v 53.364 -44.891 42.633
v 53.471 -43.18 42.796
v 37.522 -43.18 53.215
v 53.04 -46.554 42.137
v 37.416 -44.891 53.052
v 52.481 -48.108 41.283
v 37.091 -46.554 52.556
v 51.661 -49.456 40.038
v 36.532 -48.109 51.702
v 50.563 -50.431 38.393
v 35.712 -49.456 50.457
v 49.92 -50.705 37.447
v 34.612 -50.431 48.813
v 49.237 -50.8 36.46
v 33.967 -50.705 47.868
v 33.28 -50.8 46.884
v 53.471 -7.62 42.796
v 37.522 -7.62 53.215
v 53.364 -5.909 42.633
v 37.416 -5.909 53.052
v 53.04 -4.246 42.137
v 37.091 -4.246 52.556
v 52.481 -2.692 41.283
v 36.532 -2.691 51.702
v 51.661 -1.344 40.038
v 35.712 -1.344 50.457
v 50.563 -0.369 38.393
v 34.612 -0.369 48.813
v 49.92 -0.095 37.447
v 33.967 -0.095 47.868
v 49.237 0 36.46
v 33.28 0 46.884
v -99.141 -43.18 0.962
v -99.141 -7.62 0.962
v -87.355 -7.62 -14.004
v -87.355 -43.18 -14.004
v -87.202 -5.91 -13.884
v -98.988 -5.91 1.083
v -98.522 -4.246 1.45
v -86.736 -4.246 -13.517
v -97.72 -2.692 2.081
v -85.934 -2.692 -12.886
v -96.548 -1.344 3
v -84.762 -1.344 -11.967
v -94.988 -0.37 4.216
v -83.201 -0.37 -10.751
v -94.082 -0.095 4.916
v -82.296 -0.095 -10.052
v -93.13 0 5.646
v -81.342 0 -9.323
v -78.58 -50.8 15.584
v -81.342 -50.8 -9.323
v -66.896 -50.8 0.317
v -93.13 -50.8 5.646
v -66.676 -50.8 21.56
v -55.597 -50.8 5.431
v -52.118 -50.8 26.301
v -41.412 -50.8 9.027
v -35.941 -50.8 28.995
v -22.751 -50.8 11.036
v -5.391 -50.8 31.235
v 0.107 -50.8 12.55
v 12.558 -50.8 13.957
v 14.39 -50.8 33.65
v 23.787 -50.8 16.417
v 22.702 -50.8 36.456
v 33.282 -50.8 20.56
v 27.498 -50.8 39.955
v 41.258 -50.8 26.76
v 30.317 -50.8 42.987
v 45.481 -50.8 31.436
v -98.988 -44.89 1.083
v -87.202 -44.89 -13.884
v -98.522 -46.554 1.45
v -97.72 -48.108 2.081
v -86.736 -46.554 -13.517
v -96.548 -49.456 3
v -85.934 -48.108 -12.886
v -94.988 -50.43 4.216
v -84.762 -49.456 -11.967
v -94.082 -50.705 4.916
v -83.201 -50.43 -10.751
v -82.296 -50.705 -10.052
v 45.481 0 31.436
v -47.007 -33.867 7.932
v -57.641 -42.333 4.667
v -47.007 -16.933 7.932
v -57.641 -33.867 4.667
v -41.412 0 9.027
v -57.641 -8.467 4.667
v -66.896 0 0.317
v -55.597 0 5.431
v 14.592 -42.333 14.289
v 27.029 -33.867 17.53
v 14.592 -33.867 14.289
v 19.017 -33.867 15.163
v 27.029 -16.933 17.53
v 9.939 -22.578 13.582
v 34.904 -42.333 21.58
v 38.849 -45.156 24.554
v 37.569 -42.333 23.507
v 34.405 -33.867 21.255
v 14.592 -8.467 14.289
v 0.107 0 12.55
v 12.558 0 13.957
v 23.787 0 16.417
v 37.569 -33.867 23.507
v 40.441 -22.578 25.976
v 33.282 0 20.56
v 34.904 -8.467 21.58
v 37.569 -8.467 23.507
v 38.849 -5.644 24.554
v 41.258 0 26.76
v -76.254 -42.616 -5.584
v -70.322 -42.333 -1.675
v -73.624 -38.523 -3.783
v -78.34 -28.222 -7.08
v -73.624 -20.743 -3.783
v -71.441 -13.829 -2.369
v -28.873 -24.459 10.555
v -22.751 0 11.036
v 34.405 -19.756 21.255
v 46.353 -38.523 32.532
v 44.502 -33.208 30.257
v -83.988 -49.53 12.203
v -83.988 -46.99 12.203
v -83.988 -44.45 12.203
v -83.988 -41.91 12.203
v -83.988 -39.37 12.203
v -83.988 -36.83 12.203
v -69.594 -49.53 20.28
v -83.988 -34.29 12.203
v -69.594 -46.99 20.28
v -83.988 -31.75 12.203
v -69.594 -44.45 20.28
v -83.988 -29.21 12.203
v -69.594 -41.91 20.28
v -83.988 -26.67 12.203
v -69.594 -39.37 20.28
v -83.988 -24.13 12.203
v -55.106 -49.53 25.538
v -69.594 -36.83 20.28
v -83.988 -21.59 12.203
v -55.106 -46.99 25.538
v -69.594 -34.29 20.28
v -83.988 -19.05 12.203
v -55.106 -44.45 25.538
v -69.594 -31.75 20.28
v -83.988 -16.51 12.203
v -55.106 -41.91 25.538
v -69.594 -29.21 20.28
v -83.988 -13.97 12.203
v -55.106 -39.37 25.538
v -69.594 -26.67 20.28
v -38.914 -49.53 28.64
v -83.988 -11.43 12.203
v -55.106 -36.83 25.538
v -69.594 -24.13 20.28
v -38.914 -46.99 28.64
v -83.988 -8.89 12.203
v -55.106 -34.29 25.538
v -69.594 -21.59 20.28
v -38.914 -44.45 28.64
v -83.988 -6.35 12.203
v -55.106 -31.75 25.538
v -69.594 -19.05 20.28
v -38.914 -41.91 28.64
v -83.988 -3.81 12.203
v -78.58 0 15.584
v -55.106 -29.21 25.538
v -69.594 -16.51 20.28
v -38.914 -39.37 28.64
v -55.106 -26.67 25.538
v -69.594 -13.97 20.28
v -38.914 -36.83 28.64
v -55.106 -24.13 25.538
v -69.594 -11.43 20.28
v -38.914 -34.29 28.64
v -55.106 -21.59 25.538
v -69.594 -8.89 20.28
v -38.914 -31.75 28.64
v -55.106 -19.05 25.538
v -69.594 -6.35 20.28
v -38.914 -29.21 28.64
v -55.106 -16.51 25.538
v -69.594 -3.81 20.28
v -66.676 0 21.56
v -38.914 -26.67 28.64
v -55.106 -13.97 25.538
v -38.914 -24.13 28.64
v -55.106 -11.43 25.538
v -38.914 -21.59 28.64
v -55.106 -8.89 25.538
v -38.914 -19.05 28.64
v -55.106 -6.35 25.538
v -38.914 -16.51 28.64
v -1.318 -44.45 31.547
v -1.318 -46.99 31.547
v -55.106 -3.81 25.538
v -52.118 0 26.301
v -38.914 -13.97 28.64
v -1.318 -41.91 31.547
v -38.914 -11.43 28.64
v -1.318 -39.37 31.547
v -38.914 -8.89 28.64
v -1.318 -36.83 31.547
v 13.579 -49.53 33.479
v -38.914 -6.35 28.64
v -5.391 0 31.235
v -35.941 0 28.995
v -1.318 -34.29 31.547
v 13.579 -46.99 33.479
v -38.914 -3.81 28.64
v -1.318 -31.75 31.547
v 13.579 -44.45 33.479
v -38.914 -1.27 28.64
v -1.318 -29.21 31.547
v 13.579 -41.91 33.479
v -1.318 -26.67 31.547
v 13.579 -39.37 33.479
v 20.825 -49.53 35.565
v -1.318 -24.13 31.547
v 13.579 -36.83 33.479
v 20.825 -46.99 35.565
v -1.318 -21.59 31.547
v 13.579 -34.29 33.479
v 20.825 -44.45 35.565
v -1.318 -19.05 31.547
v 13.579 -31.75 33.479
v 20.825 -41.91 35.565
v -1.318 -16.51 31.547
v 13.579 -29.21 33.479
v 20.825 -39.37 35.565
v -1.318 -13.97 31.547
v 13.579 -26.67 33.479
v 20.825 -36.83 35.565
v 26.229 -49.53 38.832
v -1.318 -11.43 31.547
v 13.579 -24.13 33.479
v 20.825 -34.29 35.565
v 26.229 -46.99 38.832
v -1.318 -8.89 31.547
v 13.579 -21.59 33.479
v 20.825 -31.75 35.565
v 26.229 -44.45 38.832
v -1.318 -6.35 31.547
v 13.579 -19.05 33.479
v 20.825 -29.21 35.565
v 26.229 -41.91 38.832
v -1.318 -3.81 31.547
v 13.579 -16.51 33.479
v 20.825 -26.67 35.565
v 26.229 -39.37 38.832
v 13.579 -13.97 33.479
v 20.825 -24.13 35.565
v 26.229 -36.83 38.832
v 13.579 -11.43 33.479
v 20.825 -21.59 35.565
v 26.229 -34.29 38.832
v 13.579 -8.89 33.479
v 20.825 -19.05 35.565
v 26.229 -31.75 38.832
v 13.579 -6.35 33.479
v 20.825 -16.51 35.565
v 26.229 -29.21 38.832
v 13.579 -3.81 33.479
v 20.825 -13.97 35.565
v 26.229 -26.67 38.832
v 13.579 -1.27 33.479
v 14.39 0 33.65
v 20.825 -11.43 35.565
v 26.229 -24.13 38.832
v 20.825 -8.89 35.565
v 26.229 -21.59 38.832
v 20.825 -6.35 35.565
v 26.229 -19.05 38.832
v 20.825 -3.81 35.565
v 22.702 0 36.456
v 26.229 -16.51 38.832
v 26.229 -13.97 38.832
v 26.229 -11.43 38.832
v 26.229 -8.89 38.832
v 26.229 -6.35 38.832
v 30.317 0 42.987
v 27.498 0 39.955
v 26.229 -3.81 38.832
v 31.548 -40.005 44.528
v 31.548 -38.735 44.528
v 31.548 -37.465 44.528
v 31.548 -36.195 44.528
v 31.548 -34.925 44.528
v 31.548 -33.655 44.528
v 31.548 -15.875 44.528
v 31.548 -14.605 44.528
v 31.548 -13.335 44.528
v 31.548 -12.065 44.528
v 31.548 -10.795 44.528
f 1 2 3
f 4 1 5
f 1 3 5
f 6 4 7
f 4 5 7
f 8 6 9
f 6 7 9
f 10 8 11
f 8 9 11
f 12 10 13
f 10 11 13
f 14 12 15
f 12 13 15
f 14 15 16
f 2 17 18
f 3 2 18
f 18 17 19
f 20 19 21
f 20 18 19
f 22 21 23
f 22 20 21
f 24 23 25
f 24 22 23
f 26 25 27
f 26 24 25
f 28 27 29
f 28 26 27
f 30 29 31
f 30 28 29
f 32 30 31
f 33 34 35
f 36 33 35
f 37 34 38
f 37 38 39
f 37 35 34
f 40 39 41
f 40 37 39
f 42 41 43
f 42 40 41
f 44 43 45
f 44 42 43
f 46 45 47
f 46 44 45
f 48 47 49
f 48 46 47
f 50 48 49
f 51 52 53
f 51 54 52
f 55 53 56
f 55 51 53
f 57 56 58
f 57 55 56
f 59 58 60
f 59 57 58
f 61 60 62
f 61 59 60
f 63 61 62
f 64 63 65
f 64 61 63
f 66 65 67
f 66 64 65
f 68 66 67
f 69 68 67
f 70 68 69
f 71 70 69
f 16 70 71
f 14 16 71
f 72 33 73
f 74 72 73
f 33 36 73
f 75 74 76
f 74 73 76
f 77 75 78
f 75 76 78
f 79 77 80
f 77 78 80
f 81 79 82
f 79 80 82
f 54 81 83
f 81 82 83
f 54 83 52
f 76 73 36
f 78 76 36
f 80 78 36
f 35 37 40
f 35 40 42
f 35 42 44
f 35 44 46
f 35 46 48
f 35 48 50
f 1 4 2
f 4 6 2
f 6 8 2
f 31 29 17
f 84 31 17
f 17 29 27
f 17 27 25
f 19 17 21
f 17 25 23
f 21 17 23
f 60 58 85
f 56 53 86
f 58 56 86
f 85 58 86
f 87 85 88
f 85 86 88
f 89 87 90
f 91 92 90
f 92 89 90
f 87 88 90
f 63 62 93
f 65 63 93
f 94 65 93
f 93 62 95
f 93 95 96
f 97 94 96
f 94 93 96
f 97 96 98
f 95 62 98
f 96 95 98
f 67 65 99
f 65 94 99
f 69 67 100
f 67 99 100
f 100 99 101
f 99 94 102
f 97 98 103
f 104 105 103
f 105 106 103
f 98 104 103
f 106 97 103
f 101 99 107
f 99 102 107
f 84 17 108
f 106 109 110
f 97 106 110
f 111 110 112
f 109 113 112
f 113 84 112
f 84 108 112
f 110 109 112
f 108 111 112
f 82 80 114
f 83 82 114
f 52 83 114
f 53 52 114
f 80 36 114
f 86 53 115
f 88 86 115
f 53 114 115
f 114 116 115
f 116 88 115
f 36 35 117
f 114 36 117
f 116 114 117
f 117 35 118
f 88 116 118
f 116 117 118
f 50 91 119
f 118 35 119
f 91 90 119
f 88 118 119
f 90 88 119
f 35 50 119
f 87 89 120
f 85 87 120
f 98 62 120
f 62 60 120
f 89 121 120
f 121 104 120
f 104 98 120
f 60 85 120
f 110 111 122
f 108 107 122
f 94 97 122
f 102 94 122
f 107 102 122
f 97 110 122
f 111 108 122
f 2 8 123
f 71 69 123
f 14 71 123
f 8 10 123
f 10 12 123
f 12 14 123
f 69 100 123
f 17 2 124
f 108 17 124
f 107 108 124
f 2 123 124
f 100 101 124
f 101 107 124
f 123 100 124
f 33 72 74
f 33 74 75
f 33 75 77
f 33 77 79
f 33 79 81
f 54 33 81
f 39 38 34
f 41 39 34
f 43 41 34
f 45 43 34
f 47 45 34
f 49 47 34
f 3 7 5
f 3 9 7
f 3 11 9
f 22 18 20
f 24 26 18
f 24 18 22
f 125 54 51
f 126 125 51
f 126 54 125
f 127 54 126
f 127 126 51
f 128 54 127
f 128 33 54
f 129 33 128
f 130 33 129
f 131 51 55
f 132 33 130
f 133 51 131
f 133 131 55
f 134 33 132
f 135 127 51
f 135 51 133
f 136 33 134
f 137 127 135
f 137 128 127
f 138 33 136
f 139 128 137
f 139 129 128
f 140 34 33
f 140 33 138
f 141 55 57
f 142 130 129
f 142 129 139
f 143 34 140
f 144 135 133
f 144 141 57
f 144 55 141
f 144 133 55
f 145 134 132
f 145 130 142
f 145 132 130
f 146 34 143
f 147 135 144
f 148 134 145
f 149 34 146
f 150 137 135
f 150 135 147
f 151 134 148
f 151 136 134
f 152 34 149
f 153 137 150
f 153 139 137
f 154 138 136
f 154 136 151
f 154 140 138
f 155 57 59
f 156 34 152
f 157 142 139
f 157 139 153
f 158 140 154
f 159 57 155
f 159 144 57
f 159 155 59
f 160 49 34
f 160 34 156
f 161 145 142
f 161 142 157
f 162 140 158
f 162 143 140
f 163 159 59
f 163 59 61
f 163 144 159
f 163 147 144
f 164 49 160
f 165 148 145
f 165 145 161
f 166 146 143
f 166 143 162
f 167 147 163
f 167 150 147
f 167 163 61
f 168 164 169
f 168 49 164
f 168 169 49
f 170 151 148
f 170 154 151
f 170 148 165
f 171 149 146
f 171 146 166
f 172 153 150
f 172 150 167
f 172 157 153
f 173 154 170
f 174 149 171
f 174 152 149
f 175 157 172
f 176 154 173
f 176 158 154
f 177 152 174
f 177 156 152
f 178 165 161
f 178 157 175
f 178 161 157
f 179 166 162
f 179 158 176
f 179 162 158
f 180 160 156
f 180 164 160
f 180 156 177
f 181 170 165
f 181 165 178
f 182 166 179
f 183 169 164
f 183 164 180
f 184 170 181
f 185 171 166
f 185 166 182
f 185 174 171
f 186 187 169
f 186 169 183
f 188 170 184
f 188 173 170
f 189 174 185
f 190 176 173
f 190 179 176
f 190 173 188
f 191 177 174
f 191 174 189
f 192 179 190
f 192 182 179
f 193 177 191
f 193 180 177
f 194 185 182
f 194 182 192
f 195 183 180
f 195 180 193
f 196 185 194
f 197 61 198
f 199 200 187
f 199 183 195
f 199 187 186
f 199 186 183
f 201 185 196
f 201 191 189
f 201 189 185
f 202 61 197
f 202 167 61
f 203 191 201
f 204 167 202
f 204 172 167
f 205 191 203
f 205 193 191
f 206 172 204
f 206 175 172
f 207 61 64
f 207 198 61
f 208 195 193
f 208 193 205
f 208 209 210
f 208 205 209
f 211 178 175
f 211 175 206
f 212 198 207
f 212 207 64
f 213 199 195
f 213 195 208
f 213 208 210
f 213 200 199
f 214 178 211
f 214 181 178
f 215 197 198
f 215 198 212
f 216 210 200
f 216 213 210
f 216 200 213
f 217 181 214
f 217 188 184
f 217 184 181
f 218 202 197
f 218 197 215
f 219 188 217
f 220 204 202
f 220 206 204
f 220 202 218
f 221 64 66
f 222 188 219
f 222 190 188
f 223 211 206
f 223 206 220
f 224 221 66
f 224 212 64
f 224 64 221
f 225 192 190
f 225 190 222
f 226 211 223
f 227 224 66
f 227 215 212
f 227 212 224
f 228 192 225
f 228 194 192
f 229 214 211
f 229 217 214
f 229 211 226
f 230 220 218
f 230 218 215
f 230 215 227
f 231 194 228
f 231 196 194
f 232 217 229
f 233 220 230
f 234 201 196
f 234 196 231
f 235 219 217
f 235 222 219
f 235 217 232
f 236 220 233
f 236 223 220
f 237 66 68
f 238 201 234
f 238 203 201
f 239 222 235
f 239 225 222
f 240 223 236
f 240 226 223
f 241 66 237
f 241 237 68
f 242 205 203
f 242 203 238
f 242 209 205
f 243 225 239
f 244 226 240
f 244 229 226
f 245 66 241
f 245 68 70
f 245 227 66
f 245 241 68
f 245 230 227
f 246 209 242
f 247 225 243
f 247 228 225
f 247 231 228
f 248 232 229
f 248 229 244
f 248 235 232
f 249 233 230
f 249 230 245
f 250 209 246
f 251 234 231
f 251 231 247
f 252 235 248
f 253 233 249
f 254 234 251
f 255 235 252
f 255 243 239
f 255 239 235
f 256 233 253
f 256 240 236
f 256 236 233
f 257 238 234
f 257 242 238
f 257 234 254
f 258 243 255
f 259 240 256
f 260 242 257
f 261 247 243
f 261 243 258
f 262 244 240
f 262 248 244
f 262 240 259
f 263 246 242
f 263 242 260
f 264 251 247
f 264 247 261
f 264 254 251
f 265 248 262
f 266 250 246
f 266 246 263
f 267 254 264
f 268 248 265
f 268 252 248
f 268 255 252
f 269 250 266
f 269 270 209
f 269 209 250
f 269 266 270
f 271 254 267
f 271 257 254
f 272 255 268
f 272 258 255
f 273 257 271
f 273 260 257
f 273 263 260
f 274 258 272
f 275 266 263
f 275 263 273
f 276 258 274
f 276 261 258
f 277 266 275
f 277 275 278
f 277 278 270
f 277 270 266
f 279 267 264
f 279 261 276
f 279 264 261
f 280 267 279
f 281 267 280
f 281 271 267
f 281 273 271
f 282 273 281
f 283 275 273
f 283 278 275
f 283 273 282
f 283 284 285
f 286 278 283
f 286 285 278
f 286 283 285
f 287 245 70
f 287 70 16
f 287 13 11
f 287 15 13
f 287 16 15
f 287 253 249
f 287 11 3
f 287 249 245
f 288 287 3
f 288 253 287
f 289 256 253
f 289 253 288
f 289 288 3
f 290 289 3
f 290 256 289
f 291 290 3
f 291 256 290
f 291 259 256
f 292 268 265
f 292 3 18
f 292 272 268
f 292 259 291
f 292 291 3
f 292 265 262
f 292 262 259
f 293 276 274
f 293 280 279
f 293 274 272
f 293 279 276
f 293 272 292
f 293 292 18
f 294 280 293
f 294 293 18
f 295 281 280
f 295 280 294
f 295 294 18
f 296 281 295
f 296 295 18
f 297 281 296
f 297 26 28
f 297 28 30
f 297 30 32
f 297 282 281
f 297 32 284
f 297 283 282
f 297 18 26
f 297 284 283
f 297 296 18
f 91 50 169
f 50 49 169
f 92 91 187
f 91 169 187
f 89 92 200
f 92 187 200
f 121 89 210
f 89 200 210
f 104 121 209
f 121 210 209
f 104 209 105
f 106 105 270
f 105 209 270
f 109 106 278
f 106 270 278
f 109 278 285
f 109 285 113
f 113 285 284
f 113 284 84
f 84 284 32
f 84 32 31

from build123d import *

# Parameters (mm, degrees)
F1_DEPTH = 50.8
F2_R     = 7.62


# Not quite as in the source:
# - the dataset's text gives a spline's control points without its knots; the knots are read off the source's solid


with BuildPart() as f1:
    # F0 (on Front) → F1 (new body)
    with BuildSketch(Plane.XZ):
        with BuildLine():
            Line((-99.140569867, 0.9624105209), (-87.3548537493, -14.0041988343))
            add(Edge.make_bspline(
                [(-87.3548537493, -14.0041988343), (-75.988278967, -5.0533923801), (-50.1295268695, 15.3095304535), (30.893884095, 8.2384364656), (46.8860391937, 32.7172550289), (53.4705743194, 42.7960492671)],
                knots=[0, 0, 0, 0, 0.3157202484, 0.7182578563, 1, 1, 1, 1], degree=3))
            Line((53.4705743194, 42.7960492671), (37.5223574351, 53.2151124789))
            add(Edge.make_bspline(
                [(-99.140569867, 0.9624105209), (-96.8904420168, 2.7343127228), (-92.1822042841, 6.4455239555), (-85.5235588099, 11.2675833523), (-79.5864663, 15.0368959025), (-74.7994531697, 17.76009584), (-69.6558135521, 20.3182414285), (-65.0611322891, 22.2609359989), (-61.1978217529, 23.6729575033), (-58.2065681515, 24.6544942334), (-55.1214837936, 25.5525626666), (-52.4729857991, 26.2270304858), (-50.3067006534, 26.719744138), (-48.1421714357, 27.1749366825), (-45.4314468519, 27.6813125017), (-42.1742127519, 28.2025864044), (-37.8269791769, 28.7994489886), (-32.3916532491, 29.3896702982), (-25.8983489378, 29.9250625326), (-19.4783594472, 30.3521259056), (-13.18669172, 30.728444081), (-7.0884593281, 31.106185302), (-1.2587690845, 31.5324500009), (4.2164339577, 32.0481157479), (9.2386519552, 32.6845781763), (12.9522070386, 33.3294214338), (15.5755953046, 33.9081226339), (17.3523919076, 34.3679262028), (18.6587604495, 34.7650514573), (19.5933067855, 35.0853518104), (20.2315125197, 35.3225581279), (20.8286299659, 35.5632785947), (21.5938847658, 35.8965263385), (22.4896769447, 36.3324178593), (23.4909840998, 36.8896341285), (24.7523369479, 37.6841668244), (26.2358104686, 38.7907897037), (27.9729819139, 40.3658338924), (29.7289492605, 42.2472254179), (31.5360340689, 44.4701786628), (34.0424131946, 47.8999932909), (36.0616833593, 50.9792927623), (37.5223574351, 53.2151124789)],
                knots=[0, 0, 0, 0, 0.0625, 0.125, 0.15625, 0.1875, 0.21875, 0.25, 0.265625, 0.28125, 0.296875, 0.3125, 0.3203125, 0.328125, 0.34375, 0.359375, 0.375, 0.40625, 0.4375, 0.46875, 0.5, 0.53125, 0.5625, 0.59375, 0.625, 0.65625, 0.671875, 0.6875, 0.703125, 0.7109375, 0.71875, 0.7265625, 0.734375, 0.75, 0.765625, 0.78125, 0.8125, 0.84375, 0.875, 0.90625, 0.9375, 1, 1, 1, 1], degree=3))
        make_face()
    extrude(amount=F1_DEPTH)

    # F2
    f2_edges = [f1.edges().sort_by_distance(p)[0] for p in [
        (45.496466, -50.8, 48.005581),
        (-93.247712, -50.8, -6.520894),
        (-93.247712, 0, -6.520894),
        (45.496466, 0, 48.005581),
    ]]
    fillet(f2_edges, radius=F2_R)


solid = f1.part
